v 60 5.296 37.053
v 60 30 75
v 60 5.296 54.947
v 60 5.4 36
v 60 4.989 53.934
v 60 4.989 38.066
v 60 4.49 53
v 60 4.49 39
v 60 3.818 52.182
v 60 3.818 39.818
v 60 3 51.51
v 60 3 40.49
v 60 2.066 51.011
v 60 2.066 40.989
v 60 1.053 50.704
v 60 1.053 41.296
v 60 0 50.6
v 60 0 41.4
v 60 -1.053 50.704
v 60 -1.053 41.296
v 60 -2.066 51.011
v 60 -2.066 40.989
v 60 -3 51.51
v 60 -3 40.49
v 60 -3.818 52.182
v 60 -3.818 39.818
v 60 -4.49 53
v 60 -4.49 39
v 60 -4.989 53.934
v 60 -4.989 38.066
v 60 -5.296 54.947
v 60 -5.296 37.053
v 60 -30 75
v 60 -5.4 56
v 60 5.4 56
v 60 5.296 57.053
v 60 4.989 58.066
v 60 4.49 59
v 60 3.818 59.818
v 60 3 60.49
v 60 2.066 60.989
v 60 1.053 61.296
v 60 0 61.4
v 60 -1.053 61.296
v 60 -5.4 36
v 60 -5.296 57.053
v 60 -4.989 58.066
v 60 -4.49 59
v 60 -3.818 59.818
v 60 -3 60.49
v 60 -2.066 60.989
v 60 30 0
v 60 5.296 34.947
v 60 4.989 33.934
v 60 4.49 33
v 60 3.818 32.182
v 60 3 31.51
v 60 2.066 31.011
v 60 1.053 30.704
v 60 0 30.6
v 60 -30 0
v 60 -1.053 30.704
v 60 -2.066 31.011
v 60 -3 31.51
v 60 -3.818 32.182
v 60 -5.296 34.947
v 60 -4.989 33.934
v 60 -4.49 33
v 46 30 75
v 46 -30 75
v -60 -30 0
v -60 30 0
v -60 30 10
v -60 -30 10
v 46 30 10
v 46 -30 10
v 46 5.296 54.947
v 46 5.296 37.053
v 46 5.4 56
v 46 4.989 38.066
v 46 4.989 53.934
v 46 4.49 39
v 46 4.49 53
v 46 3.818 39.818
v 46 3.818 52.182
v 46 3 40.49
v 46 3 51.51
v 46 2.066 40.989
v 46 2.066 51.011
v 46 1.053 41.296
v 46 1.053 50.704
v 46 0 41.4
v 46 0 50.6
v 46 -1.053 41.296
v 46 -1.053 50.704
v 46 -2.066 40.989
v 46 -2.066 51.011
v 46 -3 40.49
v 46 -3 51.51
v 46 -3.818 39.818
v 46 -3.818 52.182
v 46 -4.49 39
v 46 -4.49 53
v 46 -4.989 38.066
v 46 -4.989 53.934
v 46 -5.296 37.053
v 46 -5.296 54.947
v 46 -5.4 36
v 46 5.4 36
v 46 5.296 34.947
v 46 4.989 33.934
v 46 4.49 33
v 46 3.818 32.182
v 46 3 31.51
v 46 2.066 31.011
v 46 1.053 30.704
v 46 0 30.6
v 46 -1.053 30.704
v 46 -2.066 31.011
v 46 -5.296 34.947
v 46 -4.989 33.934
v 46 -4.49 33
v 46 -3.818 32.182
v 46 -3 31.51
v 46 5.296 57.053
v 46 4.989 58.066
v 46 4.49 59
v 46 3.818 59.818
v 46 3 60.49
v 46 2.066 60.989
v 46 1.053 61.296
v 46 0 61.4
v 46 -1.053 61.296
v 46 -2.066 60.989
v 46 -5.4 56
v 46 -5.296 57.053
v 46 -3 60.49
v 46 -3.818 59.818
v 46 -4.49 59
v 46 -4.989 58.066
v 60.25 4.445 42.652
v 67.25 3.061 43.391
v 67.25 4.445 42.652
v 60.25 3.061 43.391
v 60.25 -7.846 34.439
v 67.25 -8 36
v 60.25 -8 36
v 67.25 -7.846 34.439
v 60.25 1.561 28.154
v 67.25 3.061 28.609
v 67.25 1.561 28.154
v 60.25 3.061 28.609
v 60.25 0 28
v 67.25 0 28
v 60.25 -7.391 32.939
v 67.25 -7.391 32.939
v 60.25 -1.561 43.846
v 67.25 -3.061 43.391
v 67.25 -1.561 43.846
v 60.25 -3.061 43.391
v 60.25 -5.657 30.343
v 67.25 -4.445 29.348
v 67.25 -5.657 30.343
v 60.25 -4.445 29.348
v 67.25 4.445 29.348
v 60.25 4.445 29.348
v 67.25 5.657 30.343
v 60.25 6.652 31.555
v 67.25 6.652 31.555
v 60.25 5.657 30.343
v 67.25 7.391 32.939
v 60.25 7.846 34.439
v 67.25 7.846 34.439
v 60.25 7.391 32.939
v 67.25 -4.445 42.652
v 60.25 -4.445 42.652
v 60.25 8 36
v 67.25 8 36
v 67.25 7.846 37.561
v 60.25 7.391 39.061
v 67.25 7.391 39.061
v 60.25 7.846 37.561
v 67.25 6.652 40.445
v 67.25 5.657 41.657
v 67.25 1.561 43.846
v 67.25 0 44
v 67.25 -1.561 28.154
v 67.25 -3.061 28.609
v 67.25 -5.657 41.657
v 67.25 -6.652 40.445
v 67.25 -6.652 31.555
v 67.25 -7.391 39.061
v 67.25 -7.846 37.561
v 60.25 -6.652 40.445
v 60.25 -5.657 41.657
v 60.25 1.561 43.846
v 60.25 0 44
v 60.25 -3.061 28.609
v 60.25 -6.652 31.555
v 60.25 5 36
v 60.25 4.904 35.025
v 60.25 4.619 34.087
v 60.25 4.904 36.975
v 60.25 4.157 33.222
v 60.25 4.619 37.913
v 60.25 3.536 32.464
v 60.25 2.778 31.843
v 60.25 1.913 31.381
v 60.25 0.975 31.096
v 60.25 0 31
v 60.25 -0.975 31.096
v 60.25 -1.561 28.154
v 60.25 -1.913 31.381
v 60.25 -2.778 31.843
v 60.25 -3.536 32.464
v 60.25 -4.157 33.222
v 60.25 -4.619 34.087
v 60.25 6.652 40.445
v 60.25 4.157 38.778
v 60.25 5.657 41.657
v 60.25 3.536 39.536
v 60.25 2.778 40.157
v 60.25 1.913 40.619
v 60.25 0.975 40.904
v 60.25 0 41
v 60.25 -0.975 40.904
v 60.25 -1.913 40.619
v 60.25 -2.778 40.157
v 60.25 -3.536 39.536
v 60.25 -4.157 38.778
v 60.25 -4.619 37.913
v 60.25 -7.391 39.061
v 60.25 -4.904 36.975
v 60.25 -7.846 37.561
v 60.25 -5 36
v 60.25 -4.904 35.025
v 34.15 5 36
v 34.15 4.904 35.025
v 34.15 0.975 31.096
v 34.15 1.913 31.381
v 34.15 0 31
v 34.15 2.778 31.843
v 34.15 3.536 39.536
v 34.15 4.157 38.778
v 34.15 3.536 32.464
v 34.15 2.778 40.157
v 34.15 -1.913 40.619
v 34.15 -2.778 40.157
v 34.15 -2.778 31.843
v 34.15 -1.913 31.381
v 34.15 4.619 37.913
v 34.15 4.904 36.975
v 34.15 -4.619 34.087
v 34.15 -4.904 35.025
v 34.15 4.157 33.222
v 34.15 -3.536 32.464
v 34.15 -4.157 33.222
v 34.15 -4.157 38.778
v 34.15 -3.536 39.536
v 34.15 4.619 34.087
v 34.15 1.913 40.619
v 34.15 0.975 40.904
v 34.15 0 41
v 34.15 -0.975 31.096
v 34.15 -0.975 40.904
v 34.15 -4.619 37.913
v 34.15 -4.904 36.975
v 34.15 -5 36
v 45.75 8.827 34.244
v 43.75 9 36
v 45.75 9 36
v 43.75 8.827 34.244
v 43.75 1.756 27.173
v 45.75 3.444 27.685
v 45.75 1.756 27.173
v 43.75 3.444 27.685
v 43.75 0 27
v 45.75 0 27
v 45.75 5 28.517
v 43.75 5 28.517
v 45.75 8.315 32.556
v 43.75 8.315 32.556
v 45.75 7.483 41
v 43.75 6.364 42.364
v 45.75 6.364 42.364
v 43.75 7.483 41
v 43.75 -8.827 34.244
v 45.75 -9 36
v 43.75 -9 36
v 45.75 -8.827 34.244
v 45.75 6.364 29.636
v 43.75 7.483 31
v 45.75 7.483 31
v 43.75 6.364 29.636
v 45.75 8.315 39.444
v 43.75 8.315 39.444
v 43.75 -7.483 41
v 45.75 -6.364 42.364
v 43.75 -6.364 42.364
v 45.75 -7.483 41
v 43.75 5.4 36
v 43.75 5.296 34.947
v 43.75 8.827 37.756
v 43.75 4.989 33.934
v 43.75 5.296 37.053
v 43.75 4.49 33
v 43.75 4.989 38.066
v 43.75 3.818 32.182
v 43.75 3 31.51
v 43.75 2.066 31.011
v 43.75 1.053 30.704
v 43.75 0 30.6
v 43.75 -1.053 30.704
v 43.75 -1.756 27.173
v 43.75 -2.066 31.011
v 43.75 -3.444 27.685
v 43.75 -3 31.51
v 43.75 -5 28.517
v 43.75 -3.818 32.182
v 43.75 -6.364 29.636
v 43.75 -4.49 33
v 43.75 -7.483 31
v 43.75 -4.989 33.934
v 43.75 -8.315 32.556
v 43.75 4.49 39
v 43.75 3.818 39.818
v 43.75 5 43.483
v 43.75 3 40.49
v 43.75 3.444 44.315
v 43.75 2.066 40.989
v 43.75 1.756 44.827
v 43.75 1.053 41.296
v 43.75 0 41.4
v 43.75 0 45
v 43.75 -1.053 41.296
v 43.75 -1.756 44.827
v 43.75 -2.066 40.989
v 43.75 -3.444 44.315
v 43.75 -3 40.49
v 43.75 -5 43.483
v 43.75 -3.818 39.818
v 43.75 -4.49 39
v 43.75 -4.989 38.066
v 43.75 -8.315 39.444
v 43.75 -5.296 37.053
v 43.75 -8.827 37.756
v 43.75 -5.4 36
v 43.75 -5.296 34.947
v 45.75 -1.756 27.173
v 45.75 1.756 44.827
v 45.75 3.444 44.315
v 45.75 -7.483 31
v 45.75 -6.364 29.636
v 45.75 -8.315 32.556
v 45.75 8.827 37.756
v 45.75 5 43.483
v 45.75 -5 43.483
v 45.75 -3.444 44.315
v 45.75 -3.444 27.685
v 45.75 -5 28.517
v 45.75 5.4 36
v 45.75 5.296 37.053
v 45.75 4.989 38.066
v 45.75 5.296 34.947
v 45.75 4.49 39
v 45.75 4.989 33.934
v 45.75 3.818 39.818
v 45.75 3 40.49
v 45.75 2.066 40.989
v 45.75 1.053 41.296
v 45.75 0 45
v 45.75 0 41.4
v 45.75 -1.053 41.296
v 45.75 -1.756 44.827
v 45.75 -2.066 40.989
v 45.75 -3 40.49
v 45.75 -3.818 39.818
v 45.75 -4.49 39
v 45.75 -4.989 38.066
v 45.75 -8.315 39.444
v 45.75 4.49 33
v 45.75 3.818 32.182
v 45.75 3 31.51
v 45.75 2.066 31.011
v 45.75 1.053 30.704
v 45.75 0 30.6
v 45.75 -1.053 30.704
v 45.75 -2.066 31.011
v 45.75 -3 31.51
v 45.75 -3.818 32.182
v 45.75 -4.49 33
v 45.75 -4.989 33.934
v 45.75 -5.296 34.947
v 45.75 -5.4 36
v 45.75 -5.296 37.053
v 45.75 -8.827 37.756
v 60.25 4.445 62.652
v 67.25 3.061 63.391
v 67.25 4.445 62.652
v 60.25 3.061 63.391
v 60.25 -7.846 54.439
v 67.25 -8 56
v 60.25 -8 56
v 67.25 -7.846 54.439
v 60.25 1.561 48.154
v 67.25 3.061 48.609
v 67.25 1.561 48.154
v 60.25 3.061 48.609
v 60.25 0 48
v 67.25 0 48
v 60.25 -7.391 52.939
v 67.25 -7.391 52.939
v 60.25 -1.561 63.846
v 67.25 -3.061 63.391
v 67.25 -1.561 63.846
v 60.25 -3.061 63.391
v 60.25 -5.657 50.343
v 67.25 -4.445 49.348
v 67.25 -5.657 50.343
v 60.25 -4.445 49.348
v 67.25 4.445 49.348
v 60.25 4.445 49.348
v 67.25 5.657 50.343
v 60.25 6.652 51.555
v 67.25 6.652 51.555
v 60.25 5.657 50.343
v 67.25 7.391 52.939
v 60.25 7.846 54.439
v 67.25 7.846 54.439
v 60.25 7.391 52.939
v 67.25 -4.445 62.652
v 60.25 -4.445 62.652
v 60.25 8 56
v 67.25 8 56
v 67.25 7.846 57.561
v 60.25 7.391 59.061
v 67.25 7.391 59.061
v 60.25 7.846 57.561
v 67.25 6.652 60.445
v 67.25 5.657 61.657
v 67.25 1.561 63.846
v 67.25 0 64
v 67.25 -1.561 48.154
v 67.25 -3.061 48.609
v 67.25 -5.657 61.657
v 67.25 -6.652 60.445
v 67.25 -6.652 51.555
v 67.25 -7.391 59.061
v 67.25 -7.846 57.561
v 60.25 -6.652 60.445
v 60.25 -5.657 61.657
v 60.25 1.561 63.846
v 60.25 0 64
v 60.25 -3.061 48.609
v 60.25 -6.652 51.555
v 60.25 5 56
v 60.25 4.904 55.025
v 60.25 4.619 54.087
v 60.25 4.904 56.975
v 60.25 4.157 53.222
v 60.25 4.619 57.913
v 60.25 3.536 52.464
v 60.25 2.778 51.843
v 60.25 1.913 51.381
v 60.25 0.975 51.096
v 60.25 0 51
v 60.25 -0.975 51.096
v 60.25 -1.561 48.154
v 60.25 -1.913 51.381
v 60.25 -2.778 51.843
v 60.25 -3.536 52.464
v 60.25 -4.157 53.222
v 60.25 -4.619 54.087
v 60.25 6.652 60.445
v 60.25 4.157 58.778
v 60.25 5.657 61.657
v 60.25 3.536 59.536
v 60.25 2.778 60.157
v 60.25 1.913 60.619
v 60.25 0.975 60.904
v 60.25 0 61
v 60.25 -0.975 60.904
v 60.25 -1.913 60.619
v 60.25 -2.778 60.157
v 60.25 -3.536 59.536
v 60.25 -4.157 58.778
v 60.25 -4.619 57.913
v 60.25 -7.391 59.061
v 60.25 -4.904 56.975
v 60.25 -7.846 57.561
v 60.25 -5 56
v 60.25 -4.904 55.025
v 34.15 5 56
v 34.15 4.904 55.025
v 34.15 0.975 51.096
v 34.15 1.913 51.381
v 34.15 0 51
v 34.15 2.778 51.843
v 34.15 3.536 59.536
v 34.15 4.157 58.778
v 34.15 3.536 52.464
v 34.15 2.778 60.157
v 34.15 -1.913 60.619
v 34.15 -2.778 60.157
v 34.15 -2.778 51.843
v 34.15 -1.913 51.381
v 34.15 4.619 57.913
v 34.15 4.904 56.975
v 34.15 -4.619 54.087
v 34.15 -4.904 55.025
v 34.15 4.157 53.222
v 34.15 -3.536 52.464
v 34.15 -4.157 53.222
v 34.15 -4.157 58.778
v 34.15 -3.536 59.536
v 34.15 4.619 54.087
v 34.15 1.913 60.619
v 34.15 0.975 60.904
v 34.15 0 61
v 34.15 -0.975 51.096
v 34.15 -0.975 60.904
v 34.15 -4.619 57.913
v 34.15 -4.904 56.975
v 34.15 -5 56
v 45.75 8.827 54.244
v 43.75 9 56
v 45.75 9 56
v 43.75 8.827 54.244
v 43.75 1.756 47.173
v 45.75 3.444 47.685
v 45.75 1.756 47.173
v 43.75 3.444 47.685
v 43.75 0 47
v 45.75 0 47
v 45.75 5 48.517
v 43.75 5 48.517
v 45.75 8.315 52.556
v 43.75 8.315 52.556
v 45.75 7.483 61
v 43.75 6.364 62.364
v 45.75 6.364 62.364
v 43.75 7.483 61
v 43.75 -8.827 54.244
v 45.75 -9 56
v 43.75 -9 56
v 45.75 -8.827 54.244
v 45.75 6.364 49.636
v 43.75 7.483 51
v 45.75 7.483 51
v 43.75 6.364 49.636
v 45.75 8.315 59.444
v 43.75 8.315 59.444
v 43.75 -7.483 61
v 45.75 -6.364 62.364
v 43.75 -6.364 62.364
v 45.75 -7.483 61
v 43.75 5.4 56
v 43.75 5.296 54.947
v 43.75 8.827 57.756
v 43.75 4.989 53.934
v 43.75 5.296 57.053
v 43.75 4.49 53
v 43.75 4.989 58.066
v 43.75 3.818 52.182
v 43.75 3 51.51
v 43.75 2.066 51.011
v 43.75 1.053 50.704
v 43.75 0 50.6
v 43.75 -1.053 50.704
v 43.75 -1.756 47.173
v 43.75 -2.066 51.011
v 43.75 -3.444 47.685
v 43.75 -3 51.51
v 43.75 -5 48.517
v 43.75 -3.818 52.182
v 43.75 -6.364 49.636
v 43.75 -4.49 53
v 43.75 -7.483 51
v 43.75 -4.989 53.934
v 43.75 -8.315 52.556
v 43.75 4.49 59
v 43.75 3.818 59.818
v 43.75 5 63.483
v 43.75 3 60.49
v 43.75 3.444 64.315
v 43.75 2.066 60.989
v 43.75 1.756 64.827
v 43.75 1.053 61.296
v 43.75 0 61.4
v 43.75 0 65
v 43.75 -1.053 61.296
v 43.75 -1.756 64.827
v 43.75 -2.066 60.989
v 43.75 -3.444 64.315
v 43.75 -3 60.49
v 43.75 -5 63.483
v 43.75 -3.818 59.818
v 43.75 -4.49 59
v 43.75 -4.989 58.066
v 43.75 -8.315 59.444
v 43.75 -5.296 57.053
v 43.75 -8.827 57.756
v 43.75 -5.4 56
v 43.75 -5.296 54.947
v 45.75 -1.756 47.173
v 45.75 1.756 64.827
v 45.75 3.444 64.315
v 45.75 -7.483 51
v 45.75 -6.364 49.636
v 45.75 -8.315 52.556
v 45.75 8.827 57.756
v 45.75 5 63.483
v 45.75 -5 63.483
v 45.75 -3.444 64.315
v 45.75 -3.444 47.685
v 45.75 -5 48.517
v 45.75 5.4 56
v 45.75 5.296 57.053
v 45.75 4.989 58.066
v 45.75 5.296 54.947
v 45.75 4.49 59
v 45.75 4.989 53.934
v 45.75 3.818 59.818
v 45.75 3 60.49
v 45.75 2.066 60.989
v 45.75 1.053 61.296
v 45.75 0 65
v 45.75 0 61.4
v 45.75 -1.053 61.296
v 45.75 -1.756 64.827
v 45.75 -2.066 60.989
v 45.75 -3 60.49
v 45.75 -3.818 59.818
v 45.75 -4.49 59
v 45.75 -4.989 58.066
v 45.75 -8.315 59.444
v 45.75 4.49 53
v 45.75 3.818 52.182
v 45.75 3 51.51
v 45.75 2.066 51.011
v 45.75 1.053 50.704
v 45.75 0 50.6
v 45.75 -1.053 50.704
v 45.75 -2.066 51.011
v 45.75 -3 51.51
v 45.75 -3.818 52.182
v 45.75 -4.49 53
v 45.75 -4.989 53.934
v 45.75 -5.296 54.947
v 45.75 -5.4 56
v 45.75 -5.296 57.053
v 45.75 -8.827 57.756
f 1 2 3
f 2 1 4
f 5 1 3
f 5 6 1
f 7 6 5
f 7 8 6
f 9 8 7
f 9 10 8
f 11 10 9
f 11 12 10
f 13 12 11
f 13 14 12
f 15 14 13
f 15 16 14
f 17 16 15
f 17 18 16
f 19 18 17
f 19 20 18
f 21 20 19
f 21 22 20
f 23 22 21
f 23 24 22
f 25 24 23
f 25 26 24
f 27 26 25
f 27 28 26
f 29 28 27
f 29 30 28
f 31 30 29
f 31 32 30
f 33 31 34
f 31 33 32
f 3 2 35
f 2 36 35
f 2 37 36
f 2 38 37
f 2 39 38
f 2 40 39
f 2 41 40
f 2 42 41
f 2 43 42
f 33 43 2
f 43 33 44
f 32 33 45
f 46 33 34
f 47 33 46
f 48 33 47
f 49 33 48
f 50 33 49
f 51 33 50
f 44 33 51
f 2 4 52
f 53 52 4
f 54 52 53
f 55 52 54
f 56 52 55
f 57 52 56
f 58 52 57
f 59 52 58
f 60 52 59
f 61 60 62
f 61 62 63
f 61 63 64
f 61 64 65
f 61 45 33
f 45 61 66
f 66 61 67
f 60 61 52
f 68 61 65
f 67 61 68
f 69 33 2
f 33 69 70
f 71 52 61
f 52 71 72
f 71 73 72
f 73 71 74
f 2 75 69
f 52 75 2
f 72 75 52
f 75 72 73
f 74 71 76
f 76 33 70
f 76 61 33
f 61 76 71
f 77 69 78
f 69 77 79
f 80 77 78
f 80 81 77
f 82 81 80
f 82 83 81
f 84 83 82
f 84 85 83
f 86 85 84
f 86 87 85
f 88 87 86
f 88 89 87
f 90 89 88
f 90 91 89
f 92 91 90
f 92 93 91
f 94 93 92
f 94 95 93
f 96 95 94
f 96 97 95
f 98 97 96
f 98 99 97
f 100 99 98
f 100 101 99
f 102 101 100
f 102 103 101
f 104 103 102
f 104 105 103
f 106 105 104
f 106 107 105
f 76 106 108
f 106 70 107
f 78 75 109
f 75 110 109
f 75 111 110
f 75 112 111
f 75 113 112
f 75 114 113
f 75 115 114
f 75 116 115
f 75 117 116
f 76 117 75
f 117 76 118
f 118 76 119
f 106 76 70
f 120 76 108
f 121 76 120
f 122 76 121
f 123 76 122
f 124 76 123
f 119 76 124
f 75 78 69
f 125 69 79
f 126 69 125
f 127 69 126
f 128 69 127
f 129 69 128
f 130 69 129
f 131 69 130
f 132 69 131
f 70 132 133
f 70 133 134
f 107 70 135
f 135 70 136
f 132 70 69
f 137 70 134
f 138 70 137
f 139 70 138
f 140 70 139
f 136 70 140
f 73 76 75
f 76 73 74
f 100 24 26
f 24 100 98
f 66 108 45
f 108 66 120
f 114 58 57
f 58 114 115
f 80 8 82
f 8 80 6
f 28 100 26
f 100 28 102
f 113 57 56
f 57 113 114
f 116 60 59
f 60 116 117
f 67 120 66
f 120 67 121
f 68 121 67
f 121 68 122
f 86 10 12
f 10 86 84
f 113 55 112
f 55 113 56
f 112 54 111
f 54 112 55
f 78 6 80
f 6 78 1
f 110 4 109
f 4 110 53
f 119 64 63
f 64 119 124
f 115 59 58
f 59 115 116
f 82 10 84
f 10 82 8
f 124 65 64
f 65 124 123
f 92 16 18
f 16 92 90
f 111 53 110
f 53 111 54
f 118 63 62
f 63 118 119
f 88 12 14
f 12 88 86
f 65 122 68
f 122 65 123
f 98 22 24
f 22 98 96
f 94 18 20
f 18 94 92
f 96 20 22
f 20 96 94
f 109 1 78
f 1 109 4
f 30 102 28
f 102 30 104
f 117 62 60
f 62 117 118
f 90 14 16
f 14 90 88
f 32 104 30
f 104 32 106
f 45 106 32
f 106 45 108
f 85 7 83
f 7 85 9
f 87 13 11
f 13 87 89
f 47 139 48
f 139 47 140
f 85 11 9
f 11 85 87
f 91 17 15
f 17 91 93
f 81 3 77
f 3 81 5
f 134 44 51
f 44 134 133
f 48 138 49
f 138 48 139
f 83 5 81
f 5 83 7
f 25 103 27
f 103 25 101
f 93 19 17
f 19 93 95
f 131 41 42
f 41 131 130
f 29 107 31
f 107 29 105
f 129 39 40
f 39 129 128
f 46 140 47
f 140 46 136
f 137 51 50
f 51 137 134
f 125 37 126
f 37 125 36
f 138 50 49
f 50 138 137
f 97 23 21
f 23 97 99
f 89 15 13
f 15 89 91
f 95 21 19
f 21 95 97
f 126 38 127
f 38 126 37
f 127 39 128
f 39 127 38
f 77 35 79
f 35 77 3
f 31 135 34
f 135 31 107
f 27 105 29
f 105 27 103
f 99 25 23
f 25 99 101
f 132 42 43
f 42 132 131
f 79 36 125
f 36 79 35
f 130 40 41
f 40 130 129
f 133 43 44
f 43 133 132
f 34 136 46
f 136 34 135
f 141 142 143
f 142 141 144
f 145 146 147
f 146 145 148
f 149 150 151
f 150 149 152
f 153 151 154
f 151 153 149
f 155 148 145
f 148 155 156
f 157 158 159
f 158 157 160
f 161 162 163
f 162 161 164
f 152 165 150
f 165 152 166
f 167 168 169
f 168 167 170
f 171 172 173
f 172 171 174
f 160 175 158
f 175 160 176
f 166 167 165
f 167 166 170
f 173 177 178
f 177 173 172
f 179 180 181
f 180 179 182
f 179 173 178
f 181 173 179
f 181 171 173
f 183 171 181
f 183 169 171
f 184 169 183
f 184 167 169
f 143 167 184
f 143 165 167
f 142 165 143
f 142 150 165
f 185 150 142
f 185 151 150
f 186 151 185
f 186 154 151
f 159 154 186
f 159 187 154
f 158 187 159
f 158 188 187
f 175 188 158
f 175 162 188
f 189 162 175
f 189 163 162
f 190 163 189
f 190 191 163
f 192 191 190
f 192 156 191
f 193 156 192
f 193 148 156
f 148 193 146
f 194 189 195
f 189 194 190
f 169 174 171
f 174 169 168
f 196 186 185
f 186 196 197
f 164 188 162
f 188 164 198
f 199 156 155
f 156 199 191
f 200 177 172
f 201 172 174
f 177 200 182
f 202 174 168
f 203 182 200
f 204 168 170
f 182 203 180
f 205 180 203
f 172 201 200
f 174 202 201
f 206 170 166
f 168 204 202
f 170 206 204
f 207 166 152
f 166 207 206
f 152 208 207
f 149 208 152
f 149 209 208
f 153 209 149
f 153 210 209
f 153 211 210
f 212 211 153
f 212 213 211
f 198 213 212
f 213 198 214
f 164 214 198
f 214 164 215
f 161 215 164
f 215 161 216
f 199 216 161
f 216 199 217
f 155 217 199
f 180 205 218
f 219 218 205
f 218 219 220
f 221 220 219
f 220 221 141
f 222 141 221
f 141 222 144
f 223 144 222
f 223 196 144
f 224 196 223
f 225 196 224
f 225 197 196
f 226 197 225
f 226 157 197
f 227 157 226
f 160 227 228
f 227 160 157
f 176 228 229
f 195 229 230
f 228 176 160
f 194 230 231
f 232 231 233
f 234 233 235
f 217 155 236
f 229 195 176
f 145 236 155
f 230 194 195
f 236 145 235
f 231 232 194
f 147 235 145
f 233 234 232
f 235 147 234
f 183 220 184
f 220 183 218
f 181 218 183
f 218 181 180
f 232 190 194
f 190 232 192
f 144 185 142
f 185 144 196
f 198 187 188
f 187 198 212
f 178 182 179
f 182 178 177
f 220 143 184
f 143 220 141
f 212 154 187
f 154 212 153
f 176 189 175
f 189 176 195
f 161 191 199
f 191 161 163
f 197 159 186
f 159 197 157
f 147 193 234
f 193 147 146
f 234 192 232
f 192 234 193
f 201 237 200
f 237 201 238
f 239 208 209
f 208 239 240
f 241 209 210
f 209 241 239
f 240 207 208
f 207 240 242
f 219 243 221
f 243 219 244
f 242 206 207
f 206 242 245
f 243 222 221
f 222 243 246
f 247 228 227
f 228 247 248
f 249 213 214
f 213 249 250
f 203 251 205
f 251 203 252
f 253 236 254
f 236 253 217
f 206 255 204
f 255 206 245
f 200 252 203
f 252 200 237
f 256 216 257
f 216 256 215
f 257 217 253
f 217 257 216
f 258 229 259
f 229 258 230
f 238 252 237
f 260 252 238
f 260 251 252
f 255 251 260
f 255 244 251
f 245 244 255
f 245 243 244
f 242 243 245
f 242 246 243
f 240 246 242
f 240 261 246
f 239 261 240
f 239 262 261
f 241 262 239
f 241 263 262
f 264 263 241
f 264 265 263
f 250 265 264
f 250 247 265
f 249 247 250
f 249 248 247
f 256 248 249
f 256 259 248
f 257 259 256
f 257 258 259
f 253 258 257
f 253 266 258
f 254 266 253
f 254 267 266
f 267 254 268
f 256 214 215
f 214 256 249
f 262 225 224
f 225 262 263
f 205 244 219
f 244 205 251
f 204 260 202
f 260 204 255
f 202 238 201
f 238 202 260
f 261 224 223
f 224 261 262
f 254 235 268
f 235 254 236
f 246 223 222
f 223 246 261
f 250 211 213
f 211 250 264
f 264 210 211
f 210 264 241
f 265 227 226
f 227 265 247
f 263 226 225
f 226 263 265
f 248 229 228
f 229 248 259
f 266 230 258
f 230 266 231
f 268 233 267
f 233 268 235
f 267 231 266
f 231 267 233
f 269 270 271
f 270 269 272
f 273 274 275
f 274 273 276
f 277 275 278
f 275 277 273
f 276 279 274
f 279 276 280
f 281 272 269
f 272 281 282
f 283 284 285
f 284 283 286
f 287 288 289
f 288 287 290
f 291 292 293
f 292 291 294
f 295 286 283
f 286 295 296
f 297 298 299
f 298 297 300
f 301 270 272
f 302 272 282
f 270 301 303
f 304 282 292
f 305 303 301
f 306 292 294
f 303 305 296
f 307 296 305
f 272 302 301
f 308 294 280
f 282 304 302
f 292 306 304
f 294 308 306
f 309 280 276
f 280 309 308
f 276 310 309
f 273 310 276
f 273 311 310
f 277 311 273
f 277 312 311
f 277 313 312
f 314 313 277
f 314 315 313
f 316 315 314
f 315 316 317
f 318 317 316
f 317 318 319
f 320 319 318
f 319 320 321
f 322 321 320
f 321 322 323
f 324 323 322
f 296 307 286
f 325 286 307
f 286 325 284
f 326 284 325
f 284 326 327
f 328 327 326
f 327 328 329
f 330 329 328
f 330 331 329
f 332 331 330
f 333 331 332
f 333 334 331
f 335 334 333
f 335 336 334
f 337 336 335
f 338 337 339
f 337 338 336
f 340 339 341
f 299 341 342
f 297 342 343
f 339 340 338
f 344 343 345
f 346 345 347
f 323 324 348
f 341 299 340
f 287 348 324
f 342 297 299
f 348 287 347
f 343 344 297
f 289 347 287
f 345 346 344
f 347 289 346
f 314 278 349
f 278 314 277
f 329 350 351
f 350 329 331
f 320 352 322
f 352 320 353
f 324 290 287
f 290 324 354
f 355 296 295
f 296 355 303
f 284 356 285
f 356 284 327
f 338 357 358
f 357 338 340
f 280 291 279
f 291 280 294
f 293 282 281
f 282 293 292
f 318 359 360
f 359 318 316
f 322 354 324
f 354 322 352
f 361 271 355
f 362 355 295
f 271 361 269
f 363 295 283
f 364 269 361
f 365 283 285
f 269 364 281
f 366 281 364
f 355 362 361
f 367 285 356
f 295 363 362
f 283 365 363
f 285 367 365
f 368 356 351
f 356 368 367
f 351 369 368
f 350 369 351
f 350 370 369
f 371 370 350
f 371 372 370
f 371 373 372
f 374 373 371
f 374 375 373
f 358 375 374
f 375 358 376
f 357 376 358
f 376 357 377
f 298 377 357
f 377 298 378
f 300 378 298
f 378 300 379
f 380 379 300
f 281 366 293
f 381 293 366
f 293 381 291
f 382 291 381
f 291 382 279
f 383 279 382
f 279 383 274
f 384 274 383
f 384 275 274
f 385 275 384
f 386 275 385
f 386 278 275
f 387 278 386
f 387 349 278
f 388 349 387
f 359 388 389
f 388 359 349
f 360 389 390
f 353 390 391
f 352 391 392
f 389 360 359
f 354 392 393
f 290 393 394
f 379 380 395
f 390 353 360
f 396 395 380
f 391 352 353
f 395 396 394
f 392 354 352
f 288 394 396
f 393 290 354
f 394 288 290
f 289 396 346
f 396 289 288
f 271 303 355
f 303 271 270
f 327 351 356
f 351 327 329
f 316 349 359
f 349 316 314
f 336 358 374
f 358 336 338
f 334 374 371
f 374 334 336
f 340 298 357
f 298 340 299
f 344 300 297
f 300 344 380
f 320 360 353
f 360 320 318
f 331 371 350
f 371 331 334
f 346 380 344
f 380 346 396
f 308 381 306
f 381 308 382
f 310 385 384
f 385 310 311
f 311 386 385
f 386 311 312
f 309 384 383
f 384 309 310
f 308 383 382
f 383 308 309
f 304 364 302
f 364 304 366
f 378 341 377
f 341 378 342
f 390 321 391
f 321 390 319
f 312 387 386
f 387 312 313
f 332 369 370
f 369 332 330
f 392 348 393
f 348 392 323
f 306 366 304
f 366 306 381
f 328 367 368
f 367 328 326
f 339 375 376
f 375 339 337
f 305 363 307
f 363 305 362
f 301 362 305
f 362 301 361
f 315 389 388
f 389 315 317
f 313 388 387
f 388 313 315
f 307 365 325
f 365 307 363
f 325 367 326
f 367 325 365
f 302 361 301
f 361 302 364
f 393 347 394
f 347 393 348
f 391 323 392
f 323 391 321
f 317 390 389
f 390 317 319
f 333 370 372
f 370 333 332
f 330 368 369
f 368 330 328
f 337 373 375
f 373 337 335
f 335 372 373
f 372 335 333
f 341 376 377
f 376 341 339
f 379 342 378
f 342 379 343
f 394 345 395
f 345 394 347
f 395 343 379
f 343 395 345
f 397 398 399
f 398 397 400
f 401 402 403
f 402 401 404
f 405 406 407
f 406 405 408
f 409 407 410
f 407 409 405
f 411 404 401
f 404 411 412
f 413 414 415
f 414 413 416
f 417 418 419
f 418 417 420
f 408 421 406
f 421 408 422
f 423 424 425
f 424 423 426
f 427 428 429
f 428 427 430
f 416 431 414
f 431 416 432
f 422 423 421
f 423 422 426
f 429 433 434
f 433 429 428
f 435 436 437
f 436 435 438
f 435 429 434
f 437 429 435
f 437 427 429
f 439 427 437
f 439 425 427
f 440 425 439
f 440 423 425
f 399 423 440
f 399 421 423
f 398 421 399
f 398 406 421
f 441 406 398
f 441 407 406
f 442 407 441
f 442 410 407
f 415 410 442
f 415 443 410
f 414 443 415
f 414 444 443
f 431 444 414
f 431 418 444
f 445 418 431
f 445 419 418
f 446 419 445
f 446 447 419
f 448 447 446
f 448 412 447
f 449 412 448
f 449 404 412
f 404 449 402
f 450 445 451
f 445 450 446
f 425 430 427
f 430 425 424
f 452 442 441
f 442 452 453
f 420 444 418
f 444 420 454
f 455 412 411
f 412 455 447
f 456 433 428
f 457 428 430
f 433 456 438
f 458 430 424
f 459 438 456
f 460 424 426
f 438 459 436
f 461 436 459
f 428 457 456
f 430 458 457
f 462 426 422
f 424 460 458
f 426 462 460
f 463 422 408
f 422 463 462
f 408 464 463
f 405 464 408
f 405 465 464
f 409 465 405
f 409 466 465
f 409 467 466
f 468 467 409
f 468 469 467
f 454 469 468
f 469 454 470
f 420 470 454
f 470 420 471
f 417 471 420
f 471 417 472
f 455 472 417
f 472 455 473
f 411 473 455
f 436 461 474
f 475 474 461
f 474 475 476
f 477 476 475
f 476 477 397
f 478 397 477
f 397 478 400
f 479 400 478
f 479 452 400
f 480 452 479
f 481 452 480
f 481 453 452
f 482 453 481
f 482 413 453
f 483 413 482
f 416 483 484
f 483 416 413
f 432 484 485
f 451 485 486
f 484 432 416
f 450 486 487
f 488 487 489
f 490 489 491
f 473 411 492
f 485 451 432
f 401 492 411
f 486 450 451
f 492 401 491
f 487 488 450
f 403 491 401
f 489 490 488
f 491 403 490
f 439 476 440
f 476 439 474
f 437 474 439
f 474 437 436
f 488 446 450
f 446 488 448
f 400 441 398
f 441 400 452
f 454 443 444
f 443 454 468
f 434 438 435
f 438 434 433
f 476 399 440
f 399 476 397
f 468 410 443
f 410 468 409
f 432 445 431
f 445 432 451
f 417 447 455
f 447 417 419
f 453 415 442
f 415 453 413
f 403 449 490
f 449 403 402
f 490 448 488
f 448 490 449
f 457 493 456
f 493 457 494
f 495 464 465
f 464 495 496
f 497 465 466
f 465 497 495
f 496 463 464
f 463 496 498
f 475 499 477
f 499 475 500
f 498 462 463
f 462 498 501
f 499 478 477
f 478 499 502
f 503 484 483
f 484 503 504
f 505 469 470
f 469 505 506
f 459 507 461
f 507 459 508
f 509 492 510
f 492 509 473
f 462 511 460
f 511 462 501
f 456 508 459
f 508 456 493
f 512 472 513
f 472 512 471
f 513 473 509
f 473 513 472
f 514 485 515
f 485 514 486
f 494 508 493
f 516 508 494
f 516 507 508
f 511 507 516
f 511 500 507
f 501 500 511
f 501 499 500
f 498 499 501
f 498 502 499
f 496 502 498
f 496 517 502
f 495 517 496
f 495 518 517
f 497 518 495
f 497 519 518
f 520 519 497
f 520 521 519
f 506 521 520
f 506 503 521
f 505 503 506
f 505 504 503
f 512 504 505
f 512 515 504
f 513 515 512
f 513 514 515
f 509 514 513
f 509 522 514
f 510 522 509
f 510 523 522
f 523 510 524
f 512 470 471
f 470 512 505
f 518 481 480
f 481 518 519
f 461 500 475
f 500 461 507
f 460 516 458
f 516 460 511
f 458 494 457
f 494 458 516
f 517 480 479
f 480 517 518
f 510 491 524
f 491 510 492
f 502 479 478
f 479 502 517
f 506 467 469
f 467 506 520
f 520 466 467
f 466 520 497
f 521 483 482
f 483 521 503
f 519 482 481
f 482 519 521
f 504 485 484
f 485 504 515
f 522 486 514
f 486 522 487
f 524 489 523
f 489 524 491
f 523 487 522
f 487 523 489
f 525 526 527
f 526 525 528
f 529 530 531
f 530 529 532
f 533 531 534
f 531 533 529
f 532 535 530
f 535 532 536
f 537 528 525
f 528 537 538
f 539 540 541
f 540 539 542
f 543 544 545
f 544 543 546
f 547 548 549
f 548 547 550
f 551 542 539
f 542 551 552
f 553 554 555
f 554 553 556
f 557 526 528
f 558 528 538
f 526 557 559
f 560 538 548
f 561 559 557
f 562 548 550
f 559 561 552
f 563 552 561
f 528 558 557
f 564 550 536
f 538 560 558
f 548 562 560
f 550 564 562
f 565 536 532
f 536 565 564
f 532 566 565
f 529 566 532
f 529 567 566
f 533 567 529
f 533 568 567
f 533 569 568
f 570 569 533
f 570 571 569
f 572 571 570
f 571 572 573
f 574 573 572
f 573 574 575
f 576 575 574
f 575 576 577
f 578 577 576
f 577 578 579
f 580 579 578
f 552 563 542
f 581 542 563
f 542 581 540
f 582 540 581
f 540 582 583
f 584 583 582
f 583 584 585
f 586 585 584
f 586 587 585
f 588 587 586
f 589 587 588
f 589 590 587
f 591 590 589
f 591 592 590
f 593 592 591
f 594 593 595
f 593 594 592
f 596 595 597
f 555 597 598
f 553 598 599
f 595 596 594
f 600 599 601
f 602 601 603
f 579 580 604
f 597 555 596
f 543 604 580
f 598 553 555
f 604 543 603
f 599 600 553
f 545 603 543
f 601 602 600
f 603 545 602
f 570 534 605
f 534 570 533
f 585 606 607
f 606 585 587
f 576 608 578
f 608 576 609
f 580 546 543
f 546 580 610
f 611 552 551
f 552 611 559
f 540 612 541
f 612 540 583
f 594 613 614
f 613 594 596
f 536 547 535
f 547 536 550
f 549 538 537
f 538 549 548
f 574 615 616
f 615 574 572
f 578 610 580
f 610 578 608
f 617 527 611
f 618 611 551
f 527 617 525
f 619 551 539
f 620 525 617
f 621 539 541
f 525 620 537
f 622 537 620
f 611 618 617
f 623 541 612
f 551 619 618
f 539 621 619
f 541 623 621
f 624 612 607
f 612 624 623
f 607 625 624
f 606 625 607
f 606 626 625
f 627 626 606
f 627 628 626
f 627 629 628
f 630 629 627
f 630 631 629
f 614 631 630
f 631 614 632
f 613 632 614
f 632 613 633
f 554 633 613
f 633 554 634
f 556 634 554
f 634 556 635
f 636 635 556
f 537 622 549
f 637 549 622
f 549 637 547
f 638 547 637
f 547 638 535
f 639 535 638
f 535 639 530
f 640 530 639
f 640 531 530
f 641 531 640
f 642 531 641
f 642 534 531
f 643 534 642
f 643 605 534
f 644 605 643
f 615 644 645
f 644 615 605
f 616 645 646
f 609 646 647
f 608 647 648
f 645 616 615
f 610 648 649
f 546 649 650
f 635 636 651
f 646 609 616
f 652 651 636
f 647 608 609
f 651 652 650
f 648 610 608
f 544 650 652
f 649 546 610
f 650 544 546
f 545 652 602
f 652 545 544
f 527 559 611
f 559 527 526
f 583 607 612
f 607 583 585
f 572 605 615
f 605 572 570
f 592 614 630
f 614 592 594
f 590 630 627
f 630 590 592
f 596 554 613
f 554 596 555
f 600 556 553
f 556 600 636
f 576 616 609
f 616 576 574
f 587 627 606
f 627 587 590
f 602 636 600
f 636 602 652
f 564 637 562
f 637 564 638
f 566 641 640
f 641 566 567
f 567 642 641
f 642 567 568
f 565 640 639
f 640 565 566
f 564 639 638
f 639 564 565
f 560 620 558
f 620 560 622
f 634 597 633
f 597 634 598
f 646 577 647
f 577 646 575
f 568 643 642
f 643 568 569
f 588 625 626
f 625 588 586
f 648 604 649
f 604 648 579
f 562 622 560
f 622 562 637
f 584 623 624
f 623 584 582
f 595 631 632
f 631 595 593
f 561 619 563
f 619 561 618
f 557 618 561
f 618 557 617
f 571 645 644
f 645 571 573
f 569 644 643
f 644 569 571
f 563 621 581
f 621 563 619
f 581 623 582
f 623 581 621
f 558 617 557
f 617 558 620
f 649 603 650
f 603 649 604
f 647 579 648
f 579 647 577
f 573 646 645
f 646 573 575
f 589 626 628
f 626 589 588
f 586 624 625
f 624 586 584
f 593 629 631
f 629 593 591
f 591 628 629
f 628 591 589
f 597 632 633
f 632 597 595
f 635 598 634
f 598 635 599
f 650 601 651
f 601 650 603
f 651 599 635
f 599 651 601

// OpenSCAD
$fn = 32;

// ------------------------------------------------------------------------
// Bolted bracket: 120 x 60 mm bracket with 2 bolt joints
// Every part is its own module, assembly() places them once.
// ------------------------------------------------------------------------

// --- part 1 ---
module bracket() {
  difference() {
    translate([-60, -30, 0]) cube([120, 60, 75]);
    translate([-61, -31, 10]) cube([107, 62, 66]);
    translate([53, 0, 36]) rotate([0, 90, 0]) cylinder(h = 16, d = 10.8, center = true);
    translate([53, 0, 56]) rotate([0, 90, 0]) cylinder(h = 16, d = 10.8, center = true);
  }
}

// --- part 2 ---
module bolt1() {
  cylinder(h = 7, d = 16);
  translate([0, 0, -26.1]) cylinder(h = 26.1, d = 10);
}

// --- part 3 ---
module washer1() {
  difference() {
      translate([0, 0, 0]) cylinder(h = 2, d = 18);
      translate([0, 0, -1]) cylinder(h = 4, d = 10.8);
    }
}

// --- part 4 ---
module bolt2() {
  cylinder(h = 7, d = 16);
  translate([0, 0, -26.1]) cylinder(h = 26.1, d = 10);
}

// --- part 5 ---
module washer2() {
  difference() {
      translate([0, 0, 0]) cylinder(h = 2, d = 18);
      translate([0, 0, -1]) cylinder(h = 4, d = 10.8);
    }
}

// --- assembly ---
module assembly() {
  translate([0, 0, 0]) rotate([0, 0, 0]) bracket();
  translate([60.25, 0, 36]) rotate([0, 90, 0]) bolt1();
  translate([43.75, 0, 36]) rotate([0, 90, 0]) washer1();
  translate([60.25, 0, 56]) rotate([0, 90, 0]) bolt2();
  translate([43.75, 0, 56]) rotate([0, 90, 0]) washer2();
}

assembly();
